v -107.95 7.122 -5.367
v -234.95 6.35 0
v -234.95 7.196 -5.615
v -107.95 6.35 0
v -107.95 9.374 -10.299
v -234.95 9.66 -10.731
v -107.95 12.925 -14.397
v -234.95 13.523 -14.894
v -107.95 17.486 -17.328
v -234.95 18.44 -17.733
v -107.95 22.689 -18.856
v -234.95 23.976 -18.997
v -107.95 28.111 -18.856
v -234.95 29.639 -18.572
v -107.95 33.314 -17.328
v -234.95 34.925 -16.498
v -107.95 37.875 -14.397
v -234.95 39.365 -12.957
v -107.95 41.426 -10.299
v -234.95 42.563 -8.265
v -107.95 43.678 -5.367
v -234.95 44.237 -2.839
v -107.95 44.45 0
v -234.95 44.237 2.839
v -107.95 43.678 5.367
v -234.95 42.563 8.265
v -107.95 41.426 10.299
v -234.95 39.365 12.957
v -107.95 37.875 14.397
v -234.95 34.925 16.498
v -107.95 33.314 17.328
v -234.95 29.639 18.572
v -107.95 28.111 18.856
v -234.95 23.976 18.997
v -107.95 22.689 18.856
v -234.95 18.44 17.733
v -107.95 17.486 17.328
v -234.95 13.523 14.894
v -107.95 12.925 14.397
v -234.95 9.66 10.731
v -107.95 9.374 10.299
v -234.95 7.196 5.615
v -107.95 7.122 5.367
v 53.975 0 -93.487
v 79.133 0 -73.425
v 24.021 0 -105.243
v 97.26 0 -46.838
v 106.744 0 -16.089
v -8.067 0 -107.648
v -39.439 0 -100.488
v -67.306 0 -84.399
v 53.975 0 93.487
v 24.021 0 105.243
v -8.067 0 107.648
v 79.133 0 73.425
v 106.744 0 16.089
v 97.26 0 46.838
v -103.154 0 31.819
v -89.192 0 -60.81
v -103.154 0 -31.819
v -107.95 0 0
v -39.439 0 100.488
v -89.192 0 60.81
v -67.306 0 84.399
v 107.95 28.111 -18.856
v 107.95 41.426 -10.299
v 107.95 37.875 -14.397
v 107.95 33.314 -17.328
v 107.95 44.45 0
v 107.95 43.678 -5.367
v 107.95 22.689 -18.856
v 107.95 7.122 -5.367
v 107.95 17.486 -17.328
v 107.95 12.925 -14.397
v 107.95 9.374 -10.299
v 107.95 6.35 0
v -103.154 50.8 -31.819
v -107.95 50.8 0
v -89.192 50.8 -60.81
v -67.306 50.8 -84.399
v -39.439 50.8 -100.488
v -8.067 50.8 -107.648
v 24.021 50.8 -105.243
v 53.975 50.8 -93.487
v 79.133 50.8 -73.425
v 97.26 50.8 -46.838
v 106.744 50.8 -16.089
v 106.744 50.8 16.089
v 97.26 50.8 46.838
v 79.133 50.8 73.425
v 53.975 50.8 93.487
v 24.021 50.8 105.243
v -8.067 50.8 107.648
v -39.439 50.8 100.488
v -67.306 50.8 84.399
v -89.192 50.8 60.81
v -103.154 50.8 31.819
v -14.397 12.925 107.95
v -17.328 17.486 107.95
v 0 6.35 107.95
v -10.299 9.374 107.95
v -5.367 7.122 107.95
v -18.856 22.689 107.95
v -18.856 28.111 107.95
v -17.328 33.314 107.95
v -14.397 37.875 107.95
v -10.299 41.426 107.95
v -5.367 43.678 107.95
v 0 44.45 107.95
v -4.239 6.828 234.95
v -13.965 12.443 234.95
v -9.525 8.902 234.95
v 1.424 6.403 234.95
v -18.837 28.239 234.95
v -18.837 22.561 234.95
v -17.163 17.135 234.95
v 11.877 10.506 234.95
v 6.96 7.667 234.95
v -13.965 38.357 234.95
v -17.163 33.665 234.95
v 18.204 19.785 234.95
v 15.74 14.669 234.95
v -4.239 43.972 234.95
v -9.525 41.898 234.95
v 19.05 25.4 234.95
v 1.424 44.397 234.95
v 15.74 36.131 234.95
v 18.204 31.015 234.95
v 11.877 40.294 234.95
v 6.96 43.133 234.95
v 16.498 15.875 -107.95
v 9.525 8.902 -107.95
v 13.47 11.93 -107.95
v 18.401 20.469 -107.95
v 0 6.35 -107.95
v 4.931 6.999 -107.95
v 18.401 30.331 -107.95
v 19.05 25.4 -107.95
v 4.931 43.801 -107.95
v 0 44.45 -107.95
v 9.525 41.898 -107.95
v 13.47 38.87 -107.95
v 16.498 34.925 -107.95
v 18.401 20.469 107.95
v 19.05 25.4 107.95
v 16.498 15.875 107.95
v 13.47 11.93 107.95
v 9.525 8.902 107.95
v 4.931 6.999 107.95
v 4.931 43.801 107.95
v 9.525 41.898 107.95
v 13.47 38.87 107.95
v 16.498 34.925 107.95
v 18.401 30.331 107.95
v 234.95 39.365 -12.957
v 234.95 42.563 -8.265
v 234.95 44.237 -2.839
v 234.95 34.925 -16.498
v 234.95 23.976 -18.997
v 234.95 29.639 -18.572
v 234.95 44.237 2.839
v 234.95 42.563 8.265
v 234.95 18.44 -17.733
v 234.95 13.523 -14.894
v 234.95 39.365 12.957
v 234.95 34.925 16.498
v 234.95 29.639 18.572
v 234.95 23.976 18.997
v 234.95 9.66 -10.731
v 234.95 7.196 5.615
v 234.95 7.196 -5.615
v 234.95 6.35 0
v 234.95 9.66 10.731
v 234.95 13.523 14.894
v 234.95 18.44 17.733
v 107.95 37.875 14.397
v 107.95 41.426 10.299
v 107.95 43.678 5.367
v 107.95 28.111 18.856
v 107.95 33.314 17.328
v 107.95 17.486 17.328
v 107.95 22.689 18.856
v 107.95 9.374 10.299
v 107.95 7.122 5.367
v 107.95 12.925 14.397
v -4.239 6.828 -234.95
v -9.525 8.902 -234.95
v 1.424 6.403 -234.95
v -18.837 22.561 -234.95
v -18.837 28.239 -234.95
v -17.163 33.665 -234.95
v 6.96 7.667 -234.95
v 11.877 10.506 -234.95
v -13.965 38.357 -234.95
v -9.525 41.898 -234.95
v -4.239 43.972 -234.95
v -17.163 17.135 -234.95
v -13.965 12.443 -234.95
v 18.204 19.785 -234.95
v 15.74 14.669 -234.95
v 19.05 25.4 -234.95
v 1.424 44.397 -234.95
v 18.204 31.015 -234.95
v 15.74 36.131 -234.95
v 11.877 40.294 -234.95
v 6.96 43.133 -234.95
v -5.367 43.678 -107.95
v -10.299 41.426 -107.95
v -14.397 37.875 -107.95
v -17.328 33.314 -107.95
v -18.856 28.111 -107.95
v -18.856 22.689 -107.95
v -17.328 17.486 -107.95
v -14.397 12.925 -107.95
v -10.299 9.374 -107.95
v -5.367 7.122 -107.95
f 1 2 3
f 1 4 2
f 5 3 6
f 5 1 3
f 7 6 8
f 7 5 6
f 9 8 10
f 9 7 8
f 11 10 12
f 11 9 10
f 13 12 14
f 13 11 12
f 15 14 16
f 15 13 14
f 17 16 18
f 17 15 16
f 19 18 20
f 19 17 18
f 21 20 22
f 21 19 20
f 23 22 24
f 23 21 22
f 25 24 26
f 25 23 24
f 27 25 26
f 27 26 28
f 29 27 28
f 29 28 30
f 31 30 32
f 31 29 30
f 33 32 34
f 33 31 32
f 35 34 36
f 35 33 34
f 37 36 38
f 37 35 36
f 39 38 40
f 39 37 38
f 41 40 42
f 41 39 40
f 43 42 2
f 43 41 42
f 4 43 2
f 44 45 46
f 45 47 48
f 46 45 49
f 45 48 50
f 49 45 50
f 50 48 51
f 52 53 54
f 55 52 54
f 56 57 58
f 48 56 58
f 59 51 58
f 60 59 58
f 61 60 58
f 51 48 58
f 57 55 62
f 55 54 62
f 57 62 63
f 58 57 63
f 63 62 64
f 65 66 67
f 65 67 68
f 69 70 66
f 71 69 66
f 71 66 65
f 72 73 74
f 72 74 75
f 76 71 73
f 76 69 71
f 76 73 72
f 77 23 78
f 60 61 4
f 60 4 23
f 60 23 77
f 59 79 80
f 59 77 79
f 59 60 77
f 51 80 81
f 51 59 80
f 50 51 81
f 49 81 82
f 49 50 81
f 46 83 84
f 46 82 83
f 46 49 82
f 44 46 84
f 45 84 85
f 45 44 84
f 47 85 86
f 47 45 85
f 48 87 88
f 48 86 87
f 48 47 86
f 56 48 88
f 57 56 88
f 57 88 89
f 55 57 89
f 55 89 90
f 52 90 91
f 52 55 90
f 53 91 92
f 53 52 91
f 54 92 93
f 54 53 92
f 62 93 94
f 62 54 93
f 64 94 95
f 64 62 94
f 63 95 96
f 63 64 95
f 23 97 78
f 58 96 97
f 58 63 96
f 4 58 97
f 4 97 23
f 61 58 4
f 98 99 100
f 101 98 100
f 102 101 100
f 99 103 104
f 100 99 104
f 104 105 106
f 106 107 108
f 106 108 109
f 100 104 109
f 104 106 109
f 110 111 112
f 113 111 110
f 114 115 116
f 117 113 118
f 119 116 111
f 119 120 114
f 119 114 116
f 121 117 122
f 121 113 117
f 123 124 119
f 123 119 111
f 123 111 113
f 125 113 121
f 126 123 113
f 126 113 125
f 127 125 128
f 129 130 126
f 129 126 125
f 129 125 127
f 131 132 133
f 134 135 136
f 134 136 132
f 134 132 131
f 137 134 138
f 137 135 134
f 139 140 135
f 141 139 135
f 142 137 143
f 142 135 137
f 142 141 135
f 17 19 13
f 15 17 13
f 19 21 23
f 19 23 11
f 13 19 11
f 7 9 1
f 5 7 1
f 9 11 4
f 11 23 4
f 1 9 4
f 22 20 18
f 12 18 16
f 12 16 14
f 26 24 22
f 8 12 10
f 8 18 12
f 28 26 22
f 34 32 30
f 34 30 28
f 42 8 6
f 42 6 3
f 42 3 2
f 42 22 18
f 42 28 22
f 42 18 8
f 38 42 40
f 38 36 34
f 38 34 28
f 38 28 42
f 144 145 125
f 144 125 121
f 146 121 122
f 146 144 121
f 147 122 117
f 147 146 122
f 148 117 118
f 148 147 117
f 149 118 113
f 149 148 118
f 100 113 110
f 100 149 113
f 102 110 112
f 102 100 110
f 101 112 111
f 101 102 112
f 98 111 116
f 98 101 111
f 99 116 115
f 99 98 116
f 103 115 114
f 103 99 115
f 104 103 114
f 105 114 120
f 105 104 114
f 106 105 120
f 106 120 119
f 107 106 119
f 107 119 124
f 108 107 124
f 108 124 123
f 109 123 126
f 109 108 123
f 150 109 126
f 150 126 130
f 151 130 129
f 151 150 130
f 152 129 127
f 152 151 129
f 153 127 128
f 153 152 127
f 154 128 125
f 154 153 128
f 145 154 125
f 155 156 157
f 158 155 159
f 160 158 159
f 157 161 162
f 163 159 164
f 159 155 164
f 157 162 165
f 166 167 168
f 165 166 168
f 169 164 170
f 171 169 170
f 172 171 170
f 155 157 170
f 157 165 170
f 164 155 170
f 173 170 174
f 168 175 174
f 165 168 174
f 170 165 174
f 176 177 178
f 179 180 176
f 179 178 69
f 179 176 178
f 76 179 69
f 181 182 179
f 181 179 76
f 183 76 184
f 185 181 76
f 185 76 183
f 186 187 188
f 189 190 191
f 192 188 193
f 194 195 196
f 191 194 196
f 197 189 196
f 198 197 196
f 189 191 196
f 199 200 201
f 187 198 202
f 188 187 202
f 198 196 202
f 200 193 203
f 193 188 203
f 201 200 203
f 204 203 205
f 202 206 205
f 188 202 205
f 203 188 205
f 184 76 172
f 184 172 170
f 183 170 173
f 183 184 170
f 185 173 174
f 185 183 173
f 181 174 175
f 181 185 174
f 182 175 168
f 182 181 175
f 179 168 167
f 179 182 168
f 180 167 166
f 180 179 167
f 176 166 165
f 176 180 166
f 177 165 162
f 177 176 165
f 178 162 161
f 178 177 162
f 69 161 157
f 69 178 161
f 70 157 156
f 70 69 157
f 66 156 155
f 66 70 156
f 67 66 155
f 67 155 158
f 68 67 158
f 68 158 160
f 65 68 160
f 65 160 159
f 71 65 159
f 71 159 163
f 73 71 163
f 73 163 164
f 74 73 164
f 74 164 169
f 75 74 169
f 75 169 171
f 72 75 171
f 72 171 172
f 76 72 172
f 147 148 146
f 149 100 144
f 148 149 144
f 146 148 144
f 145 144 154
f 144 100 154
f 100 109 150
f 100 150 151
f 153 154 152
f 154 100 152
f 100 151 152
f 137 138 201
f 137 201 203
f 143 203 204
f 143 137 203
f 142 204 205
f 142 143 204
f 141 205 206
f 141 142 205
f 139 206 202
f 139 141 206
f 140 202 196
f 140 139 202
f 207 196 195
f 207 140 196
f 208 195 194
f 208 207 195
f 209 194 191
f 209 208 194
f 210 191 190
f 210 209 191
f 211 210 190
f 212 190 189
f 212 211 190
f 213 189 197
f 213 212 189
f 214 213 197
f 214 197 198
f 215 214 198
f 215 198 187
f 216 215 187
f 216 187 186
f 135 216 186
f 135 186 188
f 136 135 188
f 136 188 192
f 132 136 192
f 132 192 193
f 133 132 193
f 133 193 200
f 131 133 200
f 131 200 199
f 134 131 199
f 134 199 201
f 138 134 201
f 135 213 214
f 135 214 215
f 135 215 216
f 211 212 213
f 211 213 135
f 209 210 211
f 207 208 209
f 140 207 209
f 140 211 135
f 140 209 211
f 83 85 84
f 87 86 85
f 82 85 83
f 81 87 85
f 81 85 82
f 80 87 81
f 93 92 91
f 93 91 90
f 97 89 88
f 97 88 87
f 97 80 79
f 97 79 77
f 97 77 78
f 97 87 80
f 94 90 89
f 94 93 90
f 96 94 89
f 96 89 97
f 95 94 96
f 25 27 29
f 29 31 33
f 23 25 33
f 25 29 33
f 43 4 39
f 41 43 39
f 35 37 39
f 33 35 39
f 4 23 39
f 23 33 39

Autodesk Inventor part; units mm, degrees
sketch "Sketch1" plane through (0, 0, 0) normal (0, 1, 0) x (-1, 0, 0)
  circle A0 centre (0, 0) radius 107.95
  dimension "d0" = 215.9
extrude "Extrusion1" add sketch "Sketch1" along normal blind 50.8
ref_plane "Work Plane1" through (0, 25.4, 0) normal (0, 1, 0) x (1, 0, 0)
ref_plane "Work Plane3" through (107.95, 0, 0) normal (-1, 0, 0) x (0, -1, 0)
ref_plane "Work Plane2" through (-107.95, 0, 0) normal (-1, 0, 0) x (0, -1, 0)
ref_plane "Work Plane5" through (0, 0, -107.95) normal (0, 0, 1) x (1, 0, 0)
ref_plane "Work Plane4" through (0, 0, 107.95) normal (0, 0, 1) x (1, 0, 0)
sketch "Sketch4" plane through (0, 0, -107.95) normal (0, 0, 1) x (1, 0, 0)
  circle A0 centre (0, 25.4) radius 19.05
  line L0 (107.95, 0) -> (-107.95, 0) projected
  point P0 (0, 0)
  dimension "d9" = 38.1
  dimension "d10" = 25.4
extrude "Extrusion4" add sketch "Sketch4" against normal blind 127
sketch "Sketch5" plane through (-107.95, 0, 0) normal (-1, 0, 0) x (0, -1, 0)
  circle A0 centre (-25.4, 0) radius 19.05
  line L0 (0, 107.95) -> (0, -107.95) projected
  point P0 (0, 0)
  dimension "d13" = 38.1
  dimension "d14" = 25.4
extrude "Extrusion5" add sketch "Sketch5" along normal blind 127
sketch "Sketch6" plane through (0, 0, 107.95) normal (0, 0, 1) x (1, 0, 0)
  line L0 (0, 6.35) -> (0, 44.45) projected
  circle A0 centre (0, 25.4) radius 19.05
  point P0 (0, 0)
extrude "Extrusion6" add sketch "Sketch6" along normal blind 127
sketch "Sketch7" plane through (107.95, 0, 0) normal (-1, 0, 0) x (0, -1, 0)
  arc A0 (-6.35, 0) -> (-44.45, 0) centre (-25.4, 0) ccw projected
  circle A1 centre (-25.4, 0) radius 19.05
  point P0 (0, 0)
  point P1 (-6.35, 0)
extrude "Extrusion7" add sketch "Sketch7" against normal blind 127
properties part number "CapMid-ver1-1111-2021"
